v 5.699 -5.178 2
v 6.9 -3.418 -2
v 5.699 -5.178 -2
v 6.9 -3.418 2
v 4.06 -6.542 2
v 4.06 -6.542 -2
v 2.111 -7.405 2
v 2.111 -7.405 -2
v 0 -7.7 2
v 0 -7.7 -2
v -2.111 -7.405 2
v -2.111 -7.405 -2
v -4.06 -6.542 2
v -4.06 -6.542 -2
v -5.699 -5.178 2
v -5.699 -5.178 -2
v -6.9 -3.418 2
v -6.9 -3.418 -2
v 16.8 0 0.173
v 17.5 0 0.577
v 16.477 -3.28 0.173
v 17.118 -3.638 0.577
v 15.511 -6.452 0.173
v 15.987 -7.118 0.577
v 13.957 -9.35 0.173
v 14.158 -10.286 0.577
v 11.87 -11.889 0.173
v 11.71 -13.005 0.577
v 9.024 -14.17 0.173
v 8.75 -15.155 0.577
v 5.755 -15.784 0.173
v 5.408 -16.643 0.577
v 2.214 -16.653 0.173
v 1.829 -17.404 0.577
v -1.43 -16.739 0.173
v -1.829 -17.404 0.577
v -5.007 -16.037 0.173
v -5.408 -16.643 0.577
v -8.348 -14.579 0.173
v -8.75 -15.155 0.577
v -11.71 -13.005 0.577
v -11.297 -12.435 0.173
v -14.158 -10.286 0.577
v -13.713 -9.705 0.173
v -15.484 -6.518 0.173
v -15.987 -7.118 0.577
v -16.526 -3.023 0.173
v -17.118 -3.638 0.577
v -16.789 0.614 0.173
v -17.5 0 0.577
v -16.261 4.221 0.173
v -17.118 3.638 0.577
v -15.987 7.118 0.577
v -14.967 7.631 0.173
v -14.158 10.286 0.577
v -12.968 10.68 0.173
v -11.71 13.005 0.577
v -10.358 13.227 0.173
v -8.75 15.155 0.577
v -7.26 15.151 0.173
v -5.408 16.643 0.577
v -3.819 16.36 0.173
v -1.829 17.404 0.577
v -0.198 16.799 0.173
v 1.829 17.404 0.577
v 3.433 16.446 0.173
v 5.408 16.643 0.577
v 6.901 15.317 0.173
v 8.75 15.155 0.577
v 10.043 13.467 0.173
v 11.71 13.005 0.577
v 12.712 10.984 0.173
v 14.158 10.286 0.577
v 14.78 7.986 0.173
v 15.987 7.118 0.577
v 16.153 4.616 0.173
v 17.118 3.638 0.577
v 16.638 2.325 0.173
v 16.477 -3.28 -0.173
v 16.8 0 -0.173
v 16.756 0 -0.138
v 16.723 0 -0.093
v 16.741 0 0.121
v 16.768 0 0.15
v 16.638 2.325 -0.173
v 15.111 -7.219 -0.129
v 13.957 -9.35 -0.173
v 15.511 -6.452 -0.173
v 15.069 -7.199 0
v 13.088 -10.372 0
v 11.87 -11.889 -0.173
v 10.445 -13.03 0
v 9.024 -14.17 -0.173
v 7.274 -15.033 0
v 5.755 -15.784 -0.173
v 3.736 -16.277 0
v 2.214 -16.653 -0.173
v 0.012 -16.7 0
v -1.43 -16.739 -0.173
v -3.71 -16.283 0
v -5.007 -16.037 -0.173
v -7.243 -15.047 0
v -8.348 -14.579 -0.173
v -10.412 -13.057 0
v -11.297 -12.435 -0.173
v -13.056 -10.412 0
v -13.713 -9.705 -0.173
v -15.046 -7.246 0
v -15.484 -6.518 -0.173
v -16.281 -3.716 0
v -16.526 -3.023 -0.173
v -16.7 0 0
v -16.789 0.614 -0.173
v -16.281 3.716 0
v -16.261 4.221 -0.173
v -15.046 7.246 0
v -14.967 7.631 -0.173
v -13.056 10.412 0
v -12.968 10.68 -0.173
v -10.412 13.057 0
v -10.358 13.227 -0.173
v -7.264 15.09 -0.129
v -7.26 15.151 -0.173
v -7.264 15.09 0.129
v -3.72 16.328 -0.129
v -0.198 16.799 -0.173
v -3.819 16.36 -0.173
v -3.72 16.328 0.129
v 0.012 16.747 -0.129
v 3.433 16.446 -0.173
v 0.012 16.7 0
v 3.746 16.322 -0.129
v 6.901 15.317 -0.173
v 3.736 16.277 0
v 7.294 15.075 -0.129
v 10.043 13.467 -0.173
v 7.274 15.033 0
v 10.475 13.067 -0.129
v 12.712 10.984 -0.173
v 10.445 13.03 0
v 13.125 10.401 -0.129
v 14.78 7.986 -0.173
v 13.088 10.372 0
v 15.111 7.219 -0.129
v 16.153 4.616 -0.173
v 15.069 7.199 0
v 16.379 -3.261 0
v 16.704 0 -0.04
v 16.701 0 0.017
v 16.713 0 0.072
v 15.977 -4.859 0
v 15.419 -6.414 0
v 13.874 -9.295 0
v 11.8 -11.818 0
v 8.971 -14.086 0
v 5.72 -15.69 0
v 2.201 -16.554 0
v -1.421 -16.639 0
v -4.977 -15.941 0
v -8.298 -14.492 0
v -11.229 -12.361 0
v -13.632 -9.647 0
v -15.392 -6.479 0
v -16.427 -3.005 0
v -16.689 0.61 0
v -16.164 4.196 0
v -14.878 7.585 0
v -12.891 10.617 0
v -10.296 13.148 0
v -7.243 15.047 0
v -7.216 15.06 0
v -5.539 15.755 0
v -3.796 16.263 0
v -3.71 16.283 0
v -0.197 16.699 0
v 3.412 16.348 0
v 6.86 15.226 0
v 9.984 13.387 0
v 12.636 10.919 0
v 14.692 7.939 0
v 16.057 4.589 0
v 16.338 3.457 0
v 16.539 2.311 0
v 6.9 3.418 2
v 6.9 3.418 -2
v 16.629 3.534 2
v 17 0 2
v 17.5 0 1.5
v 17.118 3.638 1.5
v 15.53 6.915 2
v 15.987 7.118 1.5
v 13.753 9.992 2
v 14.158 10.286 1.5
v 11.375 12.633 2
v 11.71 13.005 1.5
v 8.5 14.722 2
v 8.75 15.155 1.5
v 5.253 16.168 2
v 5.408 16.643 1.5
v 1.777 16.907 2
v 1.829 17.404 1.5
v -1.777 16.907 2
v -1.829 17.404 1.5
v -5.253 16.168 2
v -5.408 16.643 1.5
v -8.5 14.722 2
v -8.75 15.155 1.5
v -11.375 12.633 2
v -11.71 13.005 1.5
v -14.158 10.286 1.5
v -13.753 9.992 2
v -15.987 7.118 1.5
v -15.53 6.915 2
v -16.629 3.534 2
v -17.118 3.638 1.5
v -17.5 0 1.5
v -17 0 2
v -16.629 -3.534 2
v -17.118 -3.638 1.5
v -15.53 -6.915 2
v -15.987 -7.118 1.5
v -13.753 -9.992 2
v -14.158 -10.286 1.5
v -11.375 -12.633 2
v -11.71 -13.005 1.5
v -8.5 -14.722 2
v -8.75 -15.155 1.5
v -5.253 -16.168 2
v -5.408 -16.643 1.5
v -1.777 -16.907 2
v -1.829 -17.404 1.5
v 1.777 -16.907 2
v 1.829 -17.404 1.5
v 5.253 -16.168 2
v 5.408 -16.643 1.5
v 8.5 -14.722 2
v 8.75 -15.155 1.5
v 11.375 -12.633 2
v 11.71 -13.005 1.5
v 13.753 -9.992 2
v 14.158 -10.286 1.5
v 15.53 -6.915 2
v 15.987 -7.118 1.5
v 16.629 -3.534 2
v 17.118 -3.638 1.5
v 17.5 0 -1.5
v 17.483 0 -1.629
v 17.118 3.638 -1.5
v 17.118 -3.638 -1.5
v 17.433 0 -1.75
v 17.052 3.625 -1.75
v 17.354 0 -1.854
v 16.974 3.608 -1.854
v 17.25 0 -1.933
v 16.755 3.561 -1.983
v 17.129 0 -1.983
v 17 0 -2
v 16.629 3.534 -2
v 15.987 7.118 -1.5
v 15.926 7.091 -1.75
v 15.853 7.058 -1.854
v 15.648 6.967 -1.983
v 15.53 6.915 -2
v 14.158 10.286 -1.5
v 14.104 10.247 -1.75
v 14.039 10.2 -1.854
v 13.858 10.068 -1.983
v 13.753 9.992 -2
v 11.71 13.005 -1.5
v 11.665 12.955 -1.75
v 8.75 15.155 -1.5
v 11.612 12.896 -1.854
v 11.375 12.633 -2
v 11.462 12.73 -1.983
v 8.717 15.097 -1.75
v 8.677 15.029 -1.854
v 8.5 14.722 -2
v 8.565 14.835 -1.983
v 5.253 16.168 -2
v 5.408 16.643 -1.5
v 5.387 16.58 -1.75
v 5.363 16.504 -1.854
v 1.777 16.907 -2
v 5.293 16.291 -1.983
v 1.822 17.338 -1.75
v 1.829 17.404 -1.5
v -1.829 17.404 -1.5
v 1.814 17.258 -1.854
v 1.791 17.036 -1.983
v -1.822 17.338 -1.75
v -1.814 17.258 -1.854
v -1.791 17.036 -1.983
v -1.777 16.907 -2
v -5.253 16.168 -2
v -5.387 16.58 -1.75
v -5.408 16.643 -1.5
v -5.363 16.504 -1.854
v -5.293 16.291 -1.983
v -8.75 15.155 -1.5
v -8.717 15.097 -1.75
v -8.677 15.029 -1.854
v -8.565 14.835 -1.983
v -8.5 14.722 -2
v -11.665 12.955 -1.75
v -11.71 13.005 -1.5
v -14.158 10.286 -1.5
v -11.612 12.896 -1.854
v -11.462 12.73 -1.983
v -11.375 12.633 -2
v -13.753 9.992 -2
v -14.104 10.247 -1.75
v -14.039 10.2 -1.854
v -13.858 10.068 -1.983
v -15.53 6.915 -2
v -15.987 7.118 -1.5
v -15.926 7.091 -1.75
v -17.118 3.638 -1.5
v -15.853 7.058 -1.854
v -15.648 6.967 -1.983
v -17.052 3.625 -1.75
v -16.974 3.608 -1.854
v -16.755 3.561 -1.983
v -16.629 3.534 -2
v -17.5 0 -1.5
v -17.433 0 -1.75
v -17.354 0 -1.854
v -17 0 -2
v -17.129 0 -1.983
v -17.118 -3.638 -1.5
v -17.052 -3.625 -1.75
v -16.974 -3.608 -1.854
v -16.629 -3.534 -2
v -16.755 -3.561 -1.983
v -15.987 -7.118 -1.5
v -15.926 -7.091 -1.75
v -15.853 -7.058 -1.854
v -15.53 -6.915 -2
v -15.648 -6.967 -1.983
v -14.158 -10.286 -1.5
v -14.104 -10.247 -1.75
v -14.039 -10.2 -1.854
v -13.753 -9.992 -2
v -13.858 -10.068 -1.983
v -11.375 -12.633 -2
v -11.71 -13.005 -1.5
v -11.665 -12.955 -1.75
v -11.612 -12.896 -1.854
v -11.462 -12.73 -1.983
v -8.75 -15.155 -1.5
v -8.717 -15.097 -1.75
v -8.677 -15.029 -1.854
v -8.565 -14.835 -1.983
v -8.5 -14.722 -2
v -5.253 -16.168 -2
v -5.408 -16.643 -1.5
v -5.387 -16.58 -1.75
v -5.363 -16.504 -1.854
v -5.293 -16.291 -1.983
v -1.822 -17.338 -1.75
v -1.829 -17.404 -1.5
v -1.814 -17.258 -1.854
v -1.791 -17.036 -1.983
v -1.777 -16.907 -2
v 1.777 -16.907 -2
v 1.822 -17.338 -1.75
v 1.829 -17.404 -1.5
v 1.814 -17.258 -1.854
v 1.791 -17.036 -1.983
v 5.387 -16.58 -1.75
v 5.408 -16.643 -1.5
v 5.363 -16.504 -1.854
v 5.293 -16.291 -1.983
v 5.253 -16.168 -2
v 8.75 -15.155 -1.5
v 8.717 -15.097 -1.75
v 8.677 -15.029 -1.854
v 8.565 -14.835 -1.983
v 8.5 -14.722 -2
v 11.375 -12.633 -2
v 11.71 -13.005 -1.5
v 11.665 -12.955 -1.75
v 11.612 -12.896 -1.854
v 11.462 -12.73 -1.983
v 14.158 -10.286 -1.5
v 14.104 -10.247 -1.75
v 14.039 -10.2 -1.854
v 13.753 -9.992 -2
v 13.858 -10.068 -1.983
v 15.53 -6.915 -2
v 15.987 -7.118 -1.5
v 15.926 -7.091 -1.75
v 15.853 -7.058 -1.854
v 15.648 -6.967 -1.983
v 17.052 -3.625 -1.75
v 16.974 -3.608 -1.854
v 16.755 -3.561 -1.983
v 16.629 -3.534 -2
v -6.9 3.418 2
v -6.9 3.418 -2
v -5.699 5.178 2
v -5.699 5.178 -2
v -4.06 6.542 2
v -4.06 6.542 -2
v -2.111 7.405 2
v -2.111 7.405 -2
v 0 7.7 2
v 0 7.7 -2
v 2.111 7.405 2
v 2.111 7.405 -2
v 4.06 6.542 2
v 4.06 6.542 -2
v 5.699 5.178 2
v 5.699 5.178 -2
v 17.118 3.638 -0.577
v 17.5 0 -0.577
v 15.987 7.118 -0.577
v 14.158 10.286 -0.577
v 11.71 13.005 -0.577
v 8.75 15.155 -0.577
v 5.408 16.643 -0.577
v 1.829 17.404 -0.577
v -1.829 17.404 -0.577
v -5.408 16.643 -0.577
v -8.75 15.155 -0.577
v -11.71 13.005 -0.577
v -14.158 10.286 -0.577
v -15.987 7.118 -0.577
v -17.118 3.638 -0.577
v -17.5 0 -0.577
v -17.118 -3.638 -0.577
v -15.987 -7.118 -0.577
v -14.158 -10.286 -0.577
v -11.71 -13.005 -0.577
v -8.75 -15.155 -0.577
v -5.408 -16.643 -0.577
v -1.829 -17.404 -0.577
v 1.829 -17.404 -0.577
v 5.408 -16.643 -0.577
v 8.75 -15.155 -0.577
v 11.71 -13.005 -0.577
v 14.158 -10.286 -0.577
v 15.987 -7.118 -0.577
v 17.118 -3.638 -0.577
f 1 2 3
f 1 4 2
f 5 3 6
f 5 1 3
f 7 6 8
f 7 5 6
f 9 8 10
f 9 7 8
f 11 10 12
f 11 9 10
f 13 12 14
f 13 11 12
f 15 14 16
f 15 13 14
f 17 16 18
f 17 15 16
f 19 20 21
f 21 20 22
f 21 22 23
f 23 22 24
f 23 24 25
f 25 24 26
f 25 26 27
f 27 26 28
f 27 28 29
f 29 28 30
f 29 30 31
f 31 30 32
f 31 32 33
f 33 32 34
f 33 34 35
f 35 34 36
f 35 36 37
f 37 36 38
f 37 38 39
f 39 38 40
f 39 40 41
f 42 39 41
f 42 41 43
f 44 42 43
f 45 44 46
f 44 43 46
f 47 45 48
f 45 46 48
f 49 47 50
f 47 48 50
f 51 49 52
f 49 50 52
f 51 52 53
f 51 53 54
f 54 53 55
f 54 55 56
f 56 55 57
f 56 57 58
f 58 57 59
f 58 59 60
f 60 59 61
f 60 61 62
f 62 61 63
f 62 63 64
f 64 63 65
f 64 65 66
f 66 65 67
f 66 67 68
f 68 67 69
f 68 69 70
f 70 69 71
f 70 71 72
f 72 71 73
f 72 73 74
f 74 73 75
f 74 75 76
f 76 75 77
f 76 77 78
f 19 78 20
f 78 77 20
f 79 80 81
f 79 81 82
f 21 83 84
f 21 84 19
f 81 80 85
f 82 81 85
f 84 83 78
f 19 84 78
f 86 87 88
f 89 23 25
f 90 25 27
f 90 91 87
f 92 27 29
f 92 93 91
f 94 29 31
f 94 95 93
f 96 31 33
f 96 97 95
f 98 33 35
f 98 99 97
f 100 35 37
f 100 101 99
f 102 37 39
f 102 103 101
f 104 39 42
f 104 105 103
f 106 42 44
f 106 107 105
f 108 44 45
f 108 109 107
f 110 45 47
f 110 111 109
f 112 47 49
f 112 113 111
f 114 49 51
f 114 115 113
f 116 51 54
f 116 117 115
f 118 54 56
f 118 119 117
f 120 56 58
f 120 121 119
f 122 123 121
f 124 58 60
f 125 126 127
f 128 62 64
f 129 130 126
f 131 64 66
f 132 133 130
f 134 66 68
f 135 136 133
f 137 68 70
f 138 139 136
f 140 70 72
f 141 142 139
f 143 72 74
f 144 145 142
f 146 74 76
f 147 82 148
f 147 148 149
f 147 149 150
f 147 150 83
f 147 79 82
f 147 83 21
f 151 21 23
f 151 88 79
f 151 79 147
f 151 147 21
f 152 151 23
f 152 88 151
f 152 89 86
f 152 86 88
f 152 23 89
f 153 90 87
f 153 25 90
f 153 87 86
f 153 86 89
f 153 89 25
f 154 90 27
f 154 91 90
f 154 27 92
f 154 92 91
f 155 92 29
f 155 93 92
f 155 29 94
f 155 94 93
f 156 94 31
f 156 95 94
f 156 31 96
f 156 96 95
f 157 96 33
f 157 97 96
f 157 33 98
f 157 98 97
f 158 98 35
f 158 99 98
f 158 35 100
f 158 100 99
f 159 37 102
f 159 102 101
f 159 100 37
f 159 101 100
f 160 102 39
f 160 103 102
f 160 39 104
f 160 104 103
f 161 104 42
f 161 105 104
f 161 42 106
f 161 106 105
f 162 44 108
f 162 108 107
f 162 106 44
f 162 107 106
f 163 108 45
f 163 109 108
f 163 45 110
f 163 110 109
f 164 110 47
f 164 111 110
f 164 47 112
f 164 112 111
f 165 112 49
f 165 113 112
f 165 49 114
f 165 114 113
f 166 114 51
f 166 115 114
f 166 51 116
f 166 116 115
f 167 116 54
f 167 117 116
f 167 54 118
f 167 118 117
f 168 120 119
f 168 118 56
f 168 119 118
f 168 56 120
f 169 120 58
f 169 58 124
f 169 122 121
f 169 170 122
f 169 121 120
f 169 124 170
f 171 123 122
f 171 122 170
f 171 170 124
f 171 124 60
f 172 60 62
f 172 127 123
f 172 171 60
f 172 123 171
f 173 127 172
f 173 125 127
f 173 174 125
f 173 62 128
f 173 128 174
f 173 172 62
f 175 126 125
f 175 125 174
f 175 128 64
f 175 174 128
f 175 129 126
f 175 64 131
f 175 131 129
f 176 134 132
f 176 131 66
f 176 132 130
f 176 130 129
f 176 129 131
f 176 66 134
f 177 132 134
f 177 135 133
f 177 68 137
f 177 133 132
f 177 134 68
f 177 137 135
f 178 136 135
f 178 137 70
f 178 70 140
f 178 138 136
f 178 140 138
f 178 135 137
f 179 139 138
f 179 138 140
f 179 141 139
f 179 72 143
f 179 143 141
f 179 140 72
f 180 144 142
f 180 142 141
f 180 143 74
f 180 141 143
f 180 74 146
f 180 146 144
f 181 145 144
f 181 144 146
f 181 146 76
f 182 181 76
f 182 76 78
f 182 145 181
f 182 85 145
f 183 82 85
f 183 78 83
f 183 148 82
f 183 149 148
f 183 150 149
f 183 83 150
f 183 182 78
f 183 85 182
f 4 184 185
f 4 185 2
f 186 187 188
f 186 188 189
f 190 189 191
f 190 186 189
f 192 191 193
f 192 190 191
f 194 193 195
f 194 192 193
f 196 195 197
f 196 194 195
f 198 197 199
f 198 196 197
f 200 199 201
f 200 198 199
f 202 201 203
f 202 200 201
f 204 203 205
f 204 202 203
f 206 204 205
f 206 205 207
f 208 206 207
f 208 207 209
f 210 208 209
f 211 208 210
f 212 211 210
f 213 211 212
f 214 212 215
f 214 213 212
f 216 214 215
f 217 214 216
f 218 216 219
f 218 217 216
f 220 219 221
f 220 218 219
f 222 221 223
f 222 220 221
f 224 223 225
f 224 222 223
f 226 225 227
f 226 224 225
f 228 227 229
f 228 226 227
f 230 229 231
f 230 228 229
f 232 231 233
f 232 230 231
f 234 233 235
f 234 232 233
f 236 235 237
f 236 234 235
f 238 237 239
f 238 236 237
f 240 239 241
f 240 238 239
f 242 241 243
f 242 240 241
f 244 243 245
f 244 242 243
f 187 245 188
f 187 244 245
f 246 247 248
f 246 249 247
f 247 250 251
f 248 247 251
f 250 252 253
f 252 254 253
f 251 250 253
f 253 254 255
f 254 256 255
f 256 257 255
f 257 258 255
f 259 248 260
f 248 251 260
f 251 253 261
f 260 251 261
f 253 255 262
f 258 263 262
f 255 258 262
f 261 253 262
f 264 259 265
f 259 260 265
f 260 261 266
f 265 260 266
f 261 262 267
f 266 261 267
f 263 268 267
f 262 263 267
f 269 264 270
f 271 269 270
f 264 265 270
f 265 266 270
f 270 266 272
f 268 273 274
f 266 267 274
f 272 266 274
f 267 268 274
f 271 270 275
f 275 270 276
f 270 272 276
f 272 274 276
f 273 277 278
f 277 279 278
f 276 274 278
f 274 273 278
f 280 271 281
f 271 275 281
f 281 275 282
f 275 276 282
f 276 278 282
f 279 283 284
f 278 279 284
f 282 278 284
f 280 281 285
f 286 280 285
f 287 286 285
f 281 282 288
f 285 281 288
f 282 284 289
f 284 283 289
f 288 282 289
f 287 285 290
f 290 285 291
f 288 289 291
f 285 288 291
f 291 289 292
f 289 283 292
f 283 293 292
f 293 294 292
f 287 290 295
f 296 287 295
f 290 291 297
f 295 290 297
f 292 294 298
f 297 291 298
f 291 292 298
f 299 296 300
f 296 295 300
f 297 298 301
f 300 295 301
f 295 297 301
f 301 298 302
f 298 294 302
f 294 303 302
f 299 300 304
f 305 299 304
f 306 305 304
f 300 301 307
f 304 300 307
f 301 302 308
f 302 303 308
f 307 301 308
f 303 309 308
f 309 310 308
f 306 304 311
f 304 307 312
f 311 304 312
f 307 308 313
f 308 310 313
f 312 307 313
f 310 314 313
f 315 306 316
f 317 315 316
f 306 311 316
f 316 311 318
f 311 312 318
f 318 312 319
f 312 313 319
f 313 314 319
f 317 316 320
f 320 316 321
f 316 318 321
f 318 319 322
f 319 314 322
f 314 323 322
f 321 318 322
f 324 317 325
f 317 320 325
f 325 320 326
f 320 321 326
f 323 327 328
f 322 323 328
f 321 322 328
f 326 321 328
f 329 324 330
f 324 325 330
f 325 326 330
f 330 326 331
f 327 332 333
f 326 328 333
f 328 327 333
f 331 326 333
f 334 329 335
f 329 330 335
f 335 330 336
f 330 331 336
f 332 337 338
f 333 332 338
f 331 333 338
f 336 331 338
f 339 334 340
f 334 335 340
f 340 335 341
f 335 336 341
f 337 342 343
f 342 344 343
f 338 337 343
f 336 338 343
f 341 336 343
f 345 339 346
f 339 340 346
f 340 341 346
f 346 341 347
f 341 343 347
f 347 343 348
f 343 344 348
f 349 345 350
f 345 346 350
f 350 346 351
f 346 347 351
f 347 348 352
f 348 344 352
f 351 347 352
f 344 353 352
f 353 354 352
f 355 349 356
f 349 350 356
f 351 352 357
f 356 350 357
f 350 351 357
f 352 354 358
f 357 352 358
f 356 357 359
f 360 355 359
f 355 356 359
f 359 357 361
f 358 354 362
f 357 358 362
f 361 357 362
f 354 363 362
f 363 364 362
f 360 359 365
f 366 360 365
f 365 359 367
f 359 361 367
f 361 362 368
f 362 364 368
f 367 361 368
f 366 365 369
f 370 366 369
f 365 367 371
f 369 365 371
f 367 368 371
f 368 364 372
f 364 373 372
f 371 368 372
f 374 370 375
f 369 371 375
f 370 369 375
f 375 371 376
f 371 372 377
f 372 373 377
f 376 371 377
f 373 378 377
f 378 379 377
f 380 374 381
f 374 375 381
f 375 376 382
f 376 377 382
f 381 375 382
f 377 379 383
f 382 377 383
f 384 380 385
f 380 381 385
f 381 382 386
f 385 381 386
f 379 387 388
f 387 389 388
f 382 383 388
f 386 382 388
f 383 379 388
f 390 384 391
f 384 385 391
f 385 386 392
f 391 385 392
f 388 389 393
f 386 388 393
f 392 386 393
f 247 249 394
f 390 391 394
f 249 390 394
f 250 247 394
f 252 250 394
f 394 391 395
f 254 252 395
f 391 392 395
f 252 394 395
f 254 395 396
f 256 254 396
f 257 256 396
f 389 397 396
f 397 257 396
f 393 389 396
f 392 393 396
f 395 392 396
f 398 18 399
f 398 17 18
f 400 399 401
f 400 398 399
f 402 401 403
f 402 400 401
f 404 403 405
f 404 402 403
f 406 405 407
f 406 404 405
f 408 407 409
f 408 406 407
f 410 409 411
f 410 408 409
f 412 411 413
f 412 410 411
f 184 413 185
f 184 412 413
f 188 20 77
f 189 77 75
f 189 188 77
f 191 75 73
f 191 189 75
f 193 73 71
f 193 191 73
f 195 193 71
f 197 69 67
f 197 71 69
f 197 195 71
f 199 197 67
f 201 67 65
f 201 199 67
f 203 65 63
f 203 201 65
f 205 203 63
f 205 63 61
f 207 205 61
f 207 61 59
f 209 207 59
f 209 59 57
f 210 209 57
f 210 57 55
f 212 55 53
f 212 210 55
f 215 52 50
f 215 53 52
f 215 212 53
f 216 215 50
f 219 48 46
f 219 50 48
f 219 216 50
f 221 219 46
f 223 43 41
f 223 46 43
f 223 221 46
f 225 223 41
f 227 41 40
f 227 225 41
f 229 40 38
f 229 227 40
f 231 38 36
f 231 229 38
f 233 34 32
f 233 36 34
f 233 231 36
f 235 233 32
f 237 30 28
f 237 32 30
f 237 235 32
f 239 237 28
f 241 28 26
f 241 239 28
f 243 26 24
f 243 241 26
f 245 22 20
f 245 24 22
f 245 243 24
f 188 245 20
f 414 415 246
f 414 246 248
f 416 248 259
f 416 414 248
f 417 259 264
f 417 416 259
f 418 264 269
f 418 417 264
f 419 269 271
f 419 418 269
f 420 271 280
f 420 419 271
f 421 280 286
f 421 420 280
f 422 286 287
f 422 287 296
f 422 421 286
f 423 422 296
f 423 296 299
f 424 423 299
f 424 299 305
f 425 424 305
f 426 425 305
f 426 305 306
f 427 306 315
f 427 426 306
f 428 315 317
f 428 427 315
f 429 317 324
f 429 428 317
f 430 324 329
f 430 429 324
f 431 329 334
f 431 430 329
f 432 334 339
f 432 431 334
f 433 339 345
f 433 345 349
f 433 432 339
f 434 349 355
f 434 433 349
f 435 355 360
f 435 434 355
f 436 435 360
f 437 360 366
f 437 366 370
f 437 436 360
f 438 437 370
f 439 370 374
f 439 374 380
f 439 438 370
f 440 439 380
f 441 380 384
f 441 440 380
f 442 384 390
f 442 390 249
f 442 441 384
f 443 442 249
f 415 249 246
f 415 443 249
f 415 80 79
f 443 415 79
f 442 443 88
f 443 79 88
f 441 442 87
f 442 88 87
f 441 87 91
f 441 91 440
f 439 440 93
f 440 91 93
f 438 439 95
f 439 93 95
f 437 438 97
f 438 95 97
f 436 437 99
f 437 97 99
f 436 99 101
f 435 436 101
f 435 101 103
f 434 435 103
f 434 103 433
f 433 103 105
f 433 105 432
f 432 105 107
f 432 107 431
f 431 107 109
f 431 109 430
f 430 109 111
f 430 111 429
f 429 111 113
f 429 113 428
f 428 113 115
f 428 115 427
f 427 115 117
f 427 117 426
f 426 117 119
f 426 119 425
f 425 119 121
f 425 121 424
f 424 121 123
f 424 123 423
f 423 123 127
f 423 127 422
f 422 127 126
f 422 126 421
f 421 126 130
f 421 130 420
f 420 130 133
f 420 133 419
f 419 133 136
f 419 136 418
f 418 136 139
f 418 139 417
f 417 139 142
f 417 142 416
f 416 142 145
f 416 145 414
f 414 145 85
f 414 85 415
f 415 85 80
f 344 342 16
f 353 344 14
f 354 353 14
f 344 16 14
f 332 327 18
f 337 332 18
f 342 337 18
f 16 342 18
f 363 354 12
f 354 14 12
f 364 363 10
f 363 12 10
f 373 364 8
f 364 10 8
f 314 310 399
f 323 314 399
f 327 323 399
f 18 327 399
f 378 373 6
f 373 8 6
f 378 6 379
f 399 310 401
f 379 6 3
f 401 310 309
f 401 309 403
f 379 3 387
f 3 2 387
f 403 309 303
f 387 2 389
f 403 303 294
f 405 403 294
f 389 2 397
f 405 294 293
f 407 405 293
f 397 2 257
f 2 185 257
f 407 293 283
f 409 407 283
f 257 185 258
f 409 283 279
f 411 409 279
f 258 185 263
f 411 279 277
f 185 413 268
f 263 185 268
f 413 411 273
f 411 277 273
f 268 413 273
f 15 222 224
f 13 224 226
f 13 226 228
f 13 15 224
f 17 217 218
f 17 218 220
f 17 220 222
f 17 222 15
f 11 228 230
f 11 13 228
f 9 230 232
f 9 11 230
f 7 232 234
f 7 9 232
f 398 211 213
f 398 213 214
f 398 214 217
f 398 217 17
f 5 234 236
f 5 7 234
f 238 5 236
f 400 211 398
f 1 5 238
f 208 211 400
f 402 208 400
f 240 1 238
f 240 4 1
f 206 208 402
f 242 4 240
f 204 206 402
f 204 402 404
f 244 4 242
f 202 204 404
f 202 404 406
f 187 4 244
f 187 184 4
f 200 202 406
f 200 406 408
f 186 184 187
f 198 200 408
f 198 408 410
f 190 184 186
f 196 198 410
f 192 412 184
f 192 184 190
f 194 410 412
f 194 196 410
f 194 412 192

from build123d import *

# Parameters (mm, degrees)
SKETCH_1_R      = 17.5
EXTRUDE_2_DEPTH = 2
CHAMFER_1_SIZE  = 0.5
FILLET_2_R      = 0.5
FILLET_3_R      = 0.2


with BuildPart() as part:
    # Эскиз1 → Бобышка-Вытянуть2 (new, symmetric)
    with BuildSketch(Plane.XY):
        Circle(SKETCH_1_R)
        with BuildLine():
            Line((6.9, 3.417601498), (6.9, -3.417601498))
            ThreePointArc((6.9, -3.417601498), (0, -7.7), (-6.9, -3.417601498))
            Line((-6.9, -3.417601498), (-6.9, 3.417601498))
            ThreePointArc((-6.9, 3.417601498), (0, 7.7), (6.9, 3.417601498))
        make_face(mode=Mode.SUBTRACT)
    extrude(amount=EXTRUDE_2_DEPTH, both=True)

    # Эскиз2 → Вырез-Повернуть1 (revolve, cut)
    with BuildSketch(Plane(origin=(0, 0, 0), x_dir=(0, 0, -1), z_dir=(1, 0, 0)), mode=Mode.PRIVATE) as cut_revolve_1_sk:
        Polygon((-0.577350269, 17.5), (0.577350269, 17.5), (0, 16.5), align=None)
    revolve(cut_revolve_1_sk.sketch.rotate(Axis((0, 0, 3.24866267), (0, 0, -1)), 90), axis=Axis((0, 0, 3.24866267), (0, 0, -1)), mode=Mode.SUBTRACT)

    # Фаска1
    chamfer_1_edges = [part.edges().sort_by_distance(p)[0] for p in [
        (-17.5, 0, 2),
    ]]
    chamfer(chamfer_1_edges, length=CHAMFER_1_SIZE)

    # Скругление2
    fillet_2_edges = [part.edges().sort_by_distance(p)[0] for p in [
        (-17.5, 0, -2),
    ]]
    fillet(fillet_2_edges, radius=FILLET_2_R)

    # Скругление3
    fillet_3_edges = [part.edges().sort_by_distance(p)[0] for p in [
        (-16.5, 0, 0),
    ]]
    fillet(fillet_3_edges, radius=FILLET_3_R)


solid = part.part
